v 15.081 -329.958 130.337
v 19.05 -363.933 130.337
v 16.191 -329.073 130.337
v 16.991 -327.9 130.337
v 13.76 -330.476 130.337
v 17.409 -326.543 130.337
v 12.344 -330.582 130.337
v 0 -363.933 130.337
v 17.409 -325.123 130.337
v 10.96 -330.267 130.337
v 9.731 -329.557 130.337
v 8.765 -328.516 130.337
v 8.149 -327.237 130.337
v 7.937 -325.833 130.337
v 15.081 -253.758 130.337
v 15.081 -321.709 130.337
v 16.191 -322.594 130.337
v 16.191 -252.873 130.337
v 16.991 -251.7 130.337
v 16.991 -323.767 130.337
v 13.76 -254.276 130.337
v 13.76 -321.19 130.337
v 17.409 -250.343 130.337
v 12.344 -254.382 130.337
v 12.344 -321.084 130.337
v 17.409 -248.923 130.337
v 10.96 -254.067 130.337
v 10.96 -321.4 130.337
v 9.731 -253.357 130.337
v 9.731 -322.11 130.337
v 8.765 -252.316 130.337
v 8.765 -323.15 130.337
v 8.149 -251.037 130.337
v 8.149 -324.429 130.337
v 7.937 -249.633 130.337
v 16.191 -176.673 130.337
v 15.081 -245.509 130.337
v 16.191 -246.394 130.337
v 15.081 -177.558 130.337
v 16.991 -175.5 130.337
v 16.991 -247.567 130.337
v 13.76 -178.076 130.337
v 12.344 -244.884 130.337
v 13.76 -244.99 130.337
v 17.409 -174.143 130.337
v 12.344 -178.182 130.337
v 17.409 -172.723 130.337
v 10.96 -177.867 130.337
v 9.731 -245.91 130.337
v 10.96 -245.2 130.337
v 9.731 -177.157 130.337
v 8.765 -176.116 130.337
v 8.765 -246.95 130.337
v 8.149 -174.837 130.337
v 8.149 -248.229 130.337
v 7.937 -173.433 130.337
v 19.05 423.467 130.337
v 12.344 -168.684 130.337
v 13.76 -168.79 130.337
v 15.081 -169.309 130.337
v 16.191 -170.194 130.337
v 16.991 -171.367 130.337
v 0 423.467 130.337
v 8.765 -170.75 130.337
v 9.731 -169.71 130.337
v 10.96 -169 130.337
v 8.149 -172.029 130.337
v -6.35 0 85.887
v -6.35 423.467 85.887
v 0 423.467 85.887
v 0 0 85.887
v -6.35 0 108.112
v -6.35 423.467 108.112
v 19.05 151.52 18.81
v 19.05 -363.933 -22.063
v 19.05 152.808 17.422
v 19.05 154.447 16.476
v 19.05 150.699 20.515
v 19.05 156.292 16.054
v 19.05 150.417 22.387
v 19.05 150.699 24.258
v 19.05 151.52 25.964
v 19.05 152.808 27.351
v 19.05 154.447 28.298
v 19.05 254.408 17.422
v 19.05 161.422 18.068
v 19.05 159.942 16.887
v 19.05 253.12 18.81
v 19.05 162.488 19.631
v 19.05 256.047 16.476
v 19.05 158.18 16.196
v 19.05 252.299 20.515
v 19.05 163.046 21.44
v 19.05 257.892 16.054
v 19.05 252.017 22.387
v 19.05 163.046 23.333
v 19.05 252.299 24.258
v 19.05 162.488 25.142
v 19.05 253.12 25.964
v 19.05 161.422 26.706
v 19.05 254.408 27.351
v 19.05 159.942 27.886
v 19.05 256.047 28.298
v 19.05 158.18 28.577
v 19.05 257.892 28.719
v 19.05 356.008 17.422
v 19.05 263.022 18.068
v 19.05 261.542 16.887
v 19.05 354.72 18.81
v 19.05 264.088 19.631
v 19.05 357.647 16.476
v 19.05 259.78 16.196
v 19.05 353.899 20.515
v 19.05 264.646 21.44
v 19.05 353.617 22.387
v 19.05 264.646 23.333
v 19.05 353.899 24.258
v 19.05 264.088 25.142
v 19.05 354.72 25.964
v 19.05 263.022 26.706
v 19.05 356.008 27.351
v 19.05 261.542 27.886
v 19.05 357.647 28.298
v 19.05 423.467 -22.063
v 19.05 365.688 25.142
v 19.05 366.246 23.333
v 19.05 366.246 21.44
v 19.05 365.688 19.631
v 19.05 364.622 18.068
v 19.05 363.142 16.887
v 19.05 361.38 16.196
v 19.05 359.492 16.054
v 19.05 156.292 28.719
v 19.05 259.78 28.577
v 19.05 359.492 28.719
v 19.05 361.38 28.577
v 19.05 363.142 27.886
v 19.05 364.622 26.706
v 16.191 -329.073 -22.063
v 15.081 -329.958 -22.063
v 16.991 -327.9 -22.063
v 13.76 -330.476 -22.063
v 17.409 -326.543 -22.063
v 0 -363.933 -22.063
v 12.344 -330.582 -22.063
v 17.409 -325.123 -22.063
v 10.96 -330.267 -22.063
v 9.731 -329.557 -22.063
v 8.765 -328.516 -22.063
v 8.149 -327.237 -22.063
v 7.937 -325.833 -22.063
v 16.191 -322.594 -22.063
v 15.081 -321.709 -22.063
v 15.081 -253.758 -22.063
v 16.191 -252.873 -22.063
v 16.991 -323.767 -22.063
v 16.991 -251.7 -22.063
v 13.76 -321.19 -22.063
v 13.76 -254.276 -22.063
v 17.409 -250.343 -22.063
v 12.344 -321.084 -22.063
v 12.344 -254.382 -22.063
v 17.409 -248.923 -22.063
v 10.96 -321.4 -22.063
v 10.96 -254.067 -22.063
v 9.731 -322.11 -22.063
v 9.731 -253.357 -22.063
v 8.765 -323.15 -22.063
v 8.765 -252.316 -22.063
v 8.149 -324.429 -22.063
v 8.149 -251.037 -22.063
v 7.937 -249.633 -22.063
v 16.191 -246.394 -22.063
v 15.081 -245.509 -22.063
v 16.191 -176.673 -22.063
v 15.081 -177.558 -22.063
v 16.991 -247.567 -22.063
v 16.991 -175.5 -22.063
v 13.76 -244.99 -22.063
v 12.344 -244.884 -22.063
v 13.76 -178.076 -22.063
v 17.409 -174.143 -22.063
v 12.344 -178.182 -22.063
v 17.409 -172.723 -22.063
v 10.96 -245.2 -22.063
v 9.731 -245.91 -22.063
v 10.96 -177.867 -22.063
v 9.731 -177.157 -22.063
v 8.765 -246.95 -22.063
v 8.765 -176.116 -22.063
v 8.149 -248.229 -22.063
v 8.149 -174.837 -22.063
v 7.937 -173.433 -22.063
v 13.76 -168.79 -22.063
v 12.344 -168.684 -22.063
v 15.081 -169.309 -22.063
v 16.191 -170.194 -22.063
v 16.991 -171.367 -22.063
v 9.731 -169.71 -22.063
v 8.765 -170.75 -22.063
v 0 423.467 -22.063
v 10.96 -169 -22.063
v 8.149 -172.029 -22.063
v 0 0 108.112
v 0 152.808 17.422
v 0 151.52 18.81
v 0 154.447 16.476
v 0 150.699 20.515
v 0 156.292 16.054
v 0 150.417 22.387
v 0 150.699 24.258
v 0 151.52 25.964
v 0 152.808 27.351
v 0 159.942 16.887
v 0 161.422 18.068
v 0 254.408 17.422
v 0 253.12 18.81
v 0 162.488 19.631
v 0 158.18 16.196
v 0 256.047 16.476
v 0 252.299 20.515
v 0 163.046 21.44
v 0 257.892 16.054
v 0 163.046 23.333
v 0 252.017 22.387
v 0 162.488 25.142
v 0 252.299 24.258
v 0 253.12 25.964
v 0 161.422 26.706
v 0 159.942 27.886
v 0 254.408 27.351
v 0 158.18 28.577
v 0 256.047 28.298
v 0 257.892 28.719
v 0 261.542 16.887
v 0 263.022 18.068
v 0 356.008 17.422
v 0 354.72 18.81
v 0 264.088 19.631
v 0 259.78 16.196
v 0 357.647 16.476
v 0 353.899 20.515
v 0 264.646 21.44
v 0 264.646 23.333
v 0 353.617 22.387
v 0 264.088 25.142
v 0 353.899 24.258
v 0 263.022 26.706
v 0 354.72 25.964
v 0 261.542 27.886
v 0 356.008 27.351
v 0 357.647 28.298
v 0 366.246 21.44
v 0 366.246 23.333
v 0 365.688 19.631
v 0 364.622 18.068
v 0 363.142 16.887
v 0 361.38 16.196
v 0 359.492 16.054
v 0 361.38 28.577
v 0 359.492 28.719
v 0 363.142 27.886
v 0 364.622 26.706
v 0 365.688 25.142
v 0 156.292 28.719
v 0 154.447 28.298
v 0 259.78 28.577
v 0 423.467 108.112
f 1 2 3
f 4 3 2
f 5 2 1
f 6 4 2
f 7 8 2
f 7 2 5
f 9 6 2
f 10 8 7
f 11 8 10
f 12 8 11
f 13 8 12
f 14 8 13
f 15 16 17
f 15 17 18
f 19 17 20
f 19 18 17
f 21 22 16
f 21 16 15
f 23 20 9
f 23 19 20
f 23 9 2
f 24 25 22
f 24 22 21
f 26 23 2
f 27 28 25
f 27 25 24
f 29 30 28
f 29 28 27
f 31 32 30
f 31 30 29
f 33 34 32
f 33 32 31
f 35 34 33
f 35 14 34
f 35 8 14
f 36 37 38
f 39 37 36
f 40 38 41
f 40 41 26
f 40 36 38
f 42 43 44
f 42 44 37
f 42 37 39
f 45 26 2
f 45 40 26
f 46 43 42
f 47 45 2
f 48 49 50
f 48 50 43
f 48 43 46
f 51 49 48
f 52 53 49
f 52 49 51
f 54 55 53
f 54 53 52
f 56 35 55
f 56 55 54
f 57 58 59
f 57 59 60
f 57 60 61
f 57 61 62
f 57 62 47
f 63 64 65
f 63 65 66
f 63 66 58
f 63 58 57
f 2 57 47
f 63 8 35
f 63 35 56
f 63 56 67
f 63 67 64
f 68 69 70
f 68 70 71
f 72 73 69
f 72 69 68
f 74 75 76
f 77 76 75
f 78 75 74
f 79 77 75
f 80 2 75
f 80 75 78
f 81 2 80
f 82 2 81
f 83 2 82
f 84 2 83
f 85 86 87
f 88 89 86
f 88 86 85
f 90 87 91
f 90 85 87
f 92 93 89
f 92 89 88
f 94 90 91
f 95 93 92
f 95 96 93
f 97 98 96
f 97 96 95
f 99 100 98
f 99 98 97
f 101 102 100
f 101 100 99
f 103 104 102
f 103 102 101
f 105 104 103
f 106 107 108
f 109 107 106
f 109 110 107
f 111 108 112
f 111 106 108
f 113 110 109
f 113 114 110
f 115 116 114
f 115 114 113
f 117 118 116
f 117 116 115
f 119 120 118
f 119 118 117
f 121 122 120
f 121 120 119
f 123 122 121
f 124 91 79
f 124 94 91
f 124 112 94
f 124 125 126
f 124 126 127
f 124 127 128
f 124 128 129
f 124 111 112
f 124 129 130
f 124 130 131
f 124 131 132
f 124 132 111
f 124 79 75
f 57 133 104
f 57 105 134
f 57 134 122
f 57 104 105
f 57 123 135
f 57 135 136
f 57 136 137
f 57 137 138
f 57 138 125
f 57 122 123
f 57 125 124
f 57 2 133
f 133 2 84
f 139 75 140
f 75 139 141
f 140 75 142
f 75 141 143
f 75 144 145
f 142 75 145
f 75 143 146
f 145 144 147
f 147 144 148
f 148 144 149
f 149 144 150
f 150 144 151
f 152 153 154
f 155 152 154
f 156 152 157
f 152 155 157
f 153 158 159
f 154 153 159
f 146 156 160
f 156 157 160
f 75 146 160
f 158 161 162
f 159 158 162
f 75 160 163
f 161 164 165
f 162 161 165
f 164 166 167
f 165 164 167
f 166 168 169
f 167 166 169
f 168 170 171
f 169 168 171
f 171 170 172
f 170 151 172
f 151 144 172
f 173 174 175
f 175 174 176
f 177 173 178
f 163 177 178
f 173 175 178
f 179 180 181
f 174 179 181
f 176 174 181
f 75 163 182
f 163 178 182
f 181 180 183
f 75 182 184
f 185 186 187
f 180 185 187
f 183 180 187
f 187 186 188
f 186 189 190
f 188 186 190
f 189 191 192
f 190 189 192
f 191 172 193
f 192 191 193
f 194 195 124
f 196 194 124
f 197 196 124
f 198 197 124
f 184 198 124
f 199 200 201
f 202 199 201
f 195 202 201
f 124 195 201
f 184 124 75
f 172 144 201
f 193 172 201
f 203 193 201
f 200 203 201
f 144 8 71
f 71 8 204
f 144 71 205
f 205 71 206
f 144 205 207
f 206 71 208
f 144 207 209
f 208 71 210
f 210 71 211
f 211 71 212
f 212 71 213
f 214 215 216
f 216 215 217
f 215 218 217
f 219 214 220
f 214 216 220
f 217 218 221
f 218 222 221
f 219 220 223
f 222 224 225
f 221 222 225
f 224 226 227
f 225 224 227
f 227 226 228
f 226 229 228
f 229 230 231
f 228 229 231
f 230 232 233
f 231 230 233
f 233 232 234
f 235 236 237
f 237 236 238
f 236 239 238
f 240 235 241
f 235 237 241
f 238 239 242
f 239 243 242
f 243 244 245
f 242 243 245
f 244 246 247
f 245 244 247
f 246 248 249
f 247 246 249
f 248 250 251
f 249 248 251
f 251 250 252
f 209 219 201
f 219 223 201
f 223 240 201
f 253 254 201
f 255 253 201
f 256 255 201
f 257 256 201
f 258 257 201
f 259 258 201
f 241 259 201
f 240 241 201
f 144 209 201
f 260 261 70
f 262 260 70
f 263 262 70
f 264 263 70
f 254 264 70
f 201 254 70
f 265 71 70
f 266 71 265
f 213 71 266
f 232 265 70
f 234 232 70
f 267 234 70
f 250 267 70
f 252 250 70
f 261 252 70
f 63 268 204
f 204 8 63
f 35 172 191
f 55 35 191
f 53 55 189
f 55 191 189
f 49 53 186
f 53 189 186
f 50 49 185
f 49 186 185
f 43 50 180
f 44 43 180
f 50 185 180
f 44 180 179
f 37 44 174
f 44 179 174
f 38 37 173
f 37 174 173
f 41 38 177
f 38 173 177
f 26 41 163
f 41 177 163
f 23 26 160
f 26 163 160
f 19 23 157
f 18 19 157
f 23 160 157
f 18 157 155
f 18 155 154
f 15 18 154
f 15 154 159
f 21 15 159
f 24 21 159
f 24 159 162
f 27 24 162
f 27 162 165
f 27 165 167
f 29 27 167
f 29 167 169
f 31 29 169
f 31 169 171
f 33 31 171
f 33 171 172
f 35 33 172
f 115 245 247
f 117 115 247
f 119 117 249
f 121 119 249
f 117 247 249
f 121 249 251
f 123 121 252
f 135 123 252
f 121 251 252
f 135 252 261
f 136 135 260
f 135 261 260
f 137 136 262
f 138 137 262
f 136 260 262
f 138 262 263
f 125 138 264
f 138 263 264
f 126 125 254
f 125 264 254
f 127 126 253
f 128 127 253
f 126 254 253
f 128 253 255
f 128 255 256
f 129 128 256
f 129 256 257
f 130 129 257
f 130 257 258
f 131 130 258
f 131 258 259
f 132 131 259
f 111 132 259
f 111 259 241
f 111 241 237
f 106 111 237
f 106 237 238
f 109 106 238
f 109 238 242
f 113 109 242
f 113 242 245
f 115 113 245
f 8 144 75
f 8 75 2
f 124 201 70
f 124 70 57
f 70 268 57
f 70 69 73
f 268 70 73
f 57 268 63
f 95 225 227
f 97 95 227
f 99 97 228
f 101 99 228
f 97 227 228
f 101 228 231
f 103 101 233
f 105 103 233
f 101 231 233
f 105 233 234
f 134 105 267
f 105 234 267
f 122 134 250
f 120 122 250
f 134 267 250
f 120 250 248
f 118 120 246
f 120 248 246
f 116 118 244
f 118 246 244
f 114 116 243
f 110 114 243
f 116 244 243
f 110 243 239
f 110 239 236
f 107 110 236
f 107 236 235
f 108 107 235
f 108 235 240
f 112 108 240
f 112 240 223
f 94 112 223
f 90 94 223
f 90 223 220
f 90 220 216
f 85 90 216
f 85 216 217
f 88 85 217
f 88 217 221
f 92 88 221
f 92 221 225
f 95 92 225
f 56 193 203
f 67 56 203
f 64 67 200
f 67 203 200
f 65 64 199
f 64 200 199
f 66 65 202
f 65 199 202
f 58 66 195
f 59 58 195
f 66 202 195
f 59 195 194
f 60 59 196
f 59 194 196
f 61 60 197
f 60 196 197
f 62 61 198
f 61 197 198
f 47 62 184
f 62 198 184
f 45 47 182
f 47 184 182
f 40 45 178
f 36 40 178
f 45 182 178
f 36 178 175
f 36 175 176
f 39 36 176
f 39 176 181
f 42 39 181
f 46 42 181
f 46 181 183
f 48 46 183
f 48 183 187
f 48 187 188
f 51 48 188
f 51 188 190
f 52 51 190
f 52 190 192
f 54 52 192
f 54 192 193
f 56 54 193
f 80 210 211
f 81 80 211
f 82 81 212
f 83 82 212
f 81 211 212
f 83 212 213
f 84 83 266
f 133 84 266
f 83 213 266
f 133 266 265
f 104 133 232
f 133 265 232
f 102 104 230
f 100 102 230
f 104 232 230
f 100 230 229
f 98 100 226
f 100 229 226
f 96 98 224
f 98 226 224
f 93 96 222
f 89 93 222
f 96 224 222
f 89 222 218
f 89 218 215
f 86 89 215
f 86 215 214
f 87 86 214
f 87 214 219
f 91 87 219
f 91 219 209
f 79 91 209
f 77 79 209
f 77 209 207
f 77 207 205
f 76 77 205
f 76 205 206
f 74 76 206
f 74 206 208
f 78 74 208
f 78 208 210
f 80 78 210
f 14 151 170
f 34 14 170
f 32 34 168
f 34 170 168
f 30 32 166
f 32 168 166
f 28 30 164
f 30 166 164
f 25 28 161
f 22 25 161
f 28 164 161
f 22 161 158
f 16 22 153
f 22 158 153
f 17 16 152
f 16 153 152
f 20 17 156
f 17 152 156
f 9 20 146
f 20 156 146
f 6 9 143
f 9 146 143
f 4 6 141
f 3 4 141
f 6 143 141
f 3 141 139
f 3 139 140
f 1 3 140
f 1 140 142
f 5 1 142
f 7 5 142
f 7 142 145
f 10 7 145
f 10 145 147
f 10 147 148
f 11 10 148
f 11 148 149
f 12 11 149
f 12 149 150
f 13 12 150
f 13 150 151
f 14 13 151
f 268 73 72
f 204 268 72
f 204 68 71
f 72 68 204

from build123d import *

# Parameters (mm, degrees)
F0_W     = 787.4
F0_H     = 152.4
F1_DEPTH = 19.05
F4_D     = 12.7
F5_D     = 9.525
F6_W     = 423.4667551786
F6_H     = 22.225
F7_DEPTH = 6.35


with BuildPart() as f1:
    # F0 (on Right) → F1 (new body)
    with BuildSketch(Plane.YZ):
        with Locations((29.7667551786, 54.1366326568)):
            Rectangle(F0_W, F0_H)
    extrude(amount=F1_DEPTH)

    # F4 (through all)
    with Locations(Plane.YZ.offset(19.05)):
        with Locations((156.7667551786, 22.3866326568), (258.3667551786, 22.3866326568), (359.9667551786, 22.3866326568)):
            Hole(F4_D / 2)

    # F5 (through all)
    with Locations(Plane.XY.offset(130.3366326568)):
        with Locations((12.7, -173.4332448214), (12.7, -249.6332448214), (12.7, -325.8332448214)):
            Hole(F5_D / 2)

    # F6 (on face) → F7 (join, symmetric)
    with BuildSketch(Plane(origin=(0, 0, 0), x_dir=(0, -1, 0), z_dir=(-1, 0, 0))):
        with Locations((-211.7333775893, 96.9991326568)):
            Rectangle(F6_W, F6_H)
    extrude(amount=F7_DEPTH, both=True)


solid = f1.part
